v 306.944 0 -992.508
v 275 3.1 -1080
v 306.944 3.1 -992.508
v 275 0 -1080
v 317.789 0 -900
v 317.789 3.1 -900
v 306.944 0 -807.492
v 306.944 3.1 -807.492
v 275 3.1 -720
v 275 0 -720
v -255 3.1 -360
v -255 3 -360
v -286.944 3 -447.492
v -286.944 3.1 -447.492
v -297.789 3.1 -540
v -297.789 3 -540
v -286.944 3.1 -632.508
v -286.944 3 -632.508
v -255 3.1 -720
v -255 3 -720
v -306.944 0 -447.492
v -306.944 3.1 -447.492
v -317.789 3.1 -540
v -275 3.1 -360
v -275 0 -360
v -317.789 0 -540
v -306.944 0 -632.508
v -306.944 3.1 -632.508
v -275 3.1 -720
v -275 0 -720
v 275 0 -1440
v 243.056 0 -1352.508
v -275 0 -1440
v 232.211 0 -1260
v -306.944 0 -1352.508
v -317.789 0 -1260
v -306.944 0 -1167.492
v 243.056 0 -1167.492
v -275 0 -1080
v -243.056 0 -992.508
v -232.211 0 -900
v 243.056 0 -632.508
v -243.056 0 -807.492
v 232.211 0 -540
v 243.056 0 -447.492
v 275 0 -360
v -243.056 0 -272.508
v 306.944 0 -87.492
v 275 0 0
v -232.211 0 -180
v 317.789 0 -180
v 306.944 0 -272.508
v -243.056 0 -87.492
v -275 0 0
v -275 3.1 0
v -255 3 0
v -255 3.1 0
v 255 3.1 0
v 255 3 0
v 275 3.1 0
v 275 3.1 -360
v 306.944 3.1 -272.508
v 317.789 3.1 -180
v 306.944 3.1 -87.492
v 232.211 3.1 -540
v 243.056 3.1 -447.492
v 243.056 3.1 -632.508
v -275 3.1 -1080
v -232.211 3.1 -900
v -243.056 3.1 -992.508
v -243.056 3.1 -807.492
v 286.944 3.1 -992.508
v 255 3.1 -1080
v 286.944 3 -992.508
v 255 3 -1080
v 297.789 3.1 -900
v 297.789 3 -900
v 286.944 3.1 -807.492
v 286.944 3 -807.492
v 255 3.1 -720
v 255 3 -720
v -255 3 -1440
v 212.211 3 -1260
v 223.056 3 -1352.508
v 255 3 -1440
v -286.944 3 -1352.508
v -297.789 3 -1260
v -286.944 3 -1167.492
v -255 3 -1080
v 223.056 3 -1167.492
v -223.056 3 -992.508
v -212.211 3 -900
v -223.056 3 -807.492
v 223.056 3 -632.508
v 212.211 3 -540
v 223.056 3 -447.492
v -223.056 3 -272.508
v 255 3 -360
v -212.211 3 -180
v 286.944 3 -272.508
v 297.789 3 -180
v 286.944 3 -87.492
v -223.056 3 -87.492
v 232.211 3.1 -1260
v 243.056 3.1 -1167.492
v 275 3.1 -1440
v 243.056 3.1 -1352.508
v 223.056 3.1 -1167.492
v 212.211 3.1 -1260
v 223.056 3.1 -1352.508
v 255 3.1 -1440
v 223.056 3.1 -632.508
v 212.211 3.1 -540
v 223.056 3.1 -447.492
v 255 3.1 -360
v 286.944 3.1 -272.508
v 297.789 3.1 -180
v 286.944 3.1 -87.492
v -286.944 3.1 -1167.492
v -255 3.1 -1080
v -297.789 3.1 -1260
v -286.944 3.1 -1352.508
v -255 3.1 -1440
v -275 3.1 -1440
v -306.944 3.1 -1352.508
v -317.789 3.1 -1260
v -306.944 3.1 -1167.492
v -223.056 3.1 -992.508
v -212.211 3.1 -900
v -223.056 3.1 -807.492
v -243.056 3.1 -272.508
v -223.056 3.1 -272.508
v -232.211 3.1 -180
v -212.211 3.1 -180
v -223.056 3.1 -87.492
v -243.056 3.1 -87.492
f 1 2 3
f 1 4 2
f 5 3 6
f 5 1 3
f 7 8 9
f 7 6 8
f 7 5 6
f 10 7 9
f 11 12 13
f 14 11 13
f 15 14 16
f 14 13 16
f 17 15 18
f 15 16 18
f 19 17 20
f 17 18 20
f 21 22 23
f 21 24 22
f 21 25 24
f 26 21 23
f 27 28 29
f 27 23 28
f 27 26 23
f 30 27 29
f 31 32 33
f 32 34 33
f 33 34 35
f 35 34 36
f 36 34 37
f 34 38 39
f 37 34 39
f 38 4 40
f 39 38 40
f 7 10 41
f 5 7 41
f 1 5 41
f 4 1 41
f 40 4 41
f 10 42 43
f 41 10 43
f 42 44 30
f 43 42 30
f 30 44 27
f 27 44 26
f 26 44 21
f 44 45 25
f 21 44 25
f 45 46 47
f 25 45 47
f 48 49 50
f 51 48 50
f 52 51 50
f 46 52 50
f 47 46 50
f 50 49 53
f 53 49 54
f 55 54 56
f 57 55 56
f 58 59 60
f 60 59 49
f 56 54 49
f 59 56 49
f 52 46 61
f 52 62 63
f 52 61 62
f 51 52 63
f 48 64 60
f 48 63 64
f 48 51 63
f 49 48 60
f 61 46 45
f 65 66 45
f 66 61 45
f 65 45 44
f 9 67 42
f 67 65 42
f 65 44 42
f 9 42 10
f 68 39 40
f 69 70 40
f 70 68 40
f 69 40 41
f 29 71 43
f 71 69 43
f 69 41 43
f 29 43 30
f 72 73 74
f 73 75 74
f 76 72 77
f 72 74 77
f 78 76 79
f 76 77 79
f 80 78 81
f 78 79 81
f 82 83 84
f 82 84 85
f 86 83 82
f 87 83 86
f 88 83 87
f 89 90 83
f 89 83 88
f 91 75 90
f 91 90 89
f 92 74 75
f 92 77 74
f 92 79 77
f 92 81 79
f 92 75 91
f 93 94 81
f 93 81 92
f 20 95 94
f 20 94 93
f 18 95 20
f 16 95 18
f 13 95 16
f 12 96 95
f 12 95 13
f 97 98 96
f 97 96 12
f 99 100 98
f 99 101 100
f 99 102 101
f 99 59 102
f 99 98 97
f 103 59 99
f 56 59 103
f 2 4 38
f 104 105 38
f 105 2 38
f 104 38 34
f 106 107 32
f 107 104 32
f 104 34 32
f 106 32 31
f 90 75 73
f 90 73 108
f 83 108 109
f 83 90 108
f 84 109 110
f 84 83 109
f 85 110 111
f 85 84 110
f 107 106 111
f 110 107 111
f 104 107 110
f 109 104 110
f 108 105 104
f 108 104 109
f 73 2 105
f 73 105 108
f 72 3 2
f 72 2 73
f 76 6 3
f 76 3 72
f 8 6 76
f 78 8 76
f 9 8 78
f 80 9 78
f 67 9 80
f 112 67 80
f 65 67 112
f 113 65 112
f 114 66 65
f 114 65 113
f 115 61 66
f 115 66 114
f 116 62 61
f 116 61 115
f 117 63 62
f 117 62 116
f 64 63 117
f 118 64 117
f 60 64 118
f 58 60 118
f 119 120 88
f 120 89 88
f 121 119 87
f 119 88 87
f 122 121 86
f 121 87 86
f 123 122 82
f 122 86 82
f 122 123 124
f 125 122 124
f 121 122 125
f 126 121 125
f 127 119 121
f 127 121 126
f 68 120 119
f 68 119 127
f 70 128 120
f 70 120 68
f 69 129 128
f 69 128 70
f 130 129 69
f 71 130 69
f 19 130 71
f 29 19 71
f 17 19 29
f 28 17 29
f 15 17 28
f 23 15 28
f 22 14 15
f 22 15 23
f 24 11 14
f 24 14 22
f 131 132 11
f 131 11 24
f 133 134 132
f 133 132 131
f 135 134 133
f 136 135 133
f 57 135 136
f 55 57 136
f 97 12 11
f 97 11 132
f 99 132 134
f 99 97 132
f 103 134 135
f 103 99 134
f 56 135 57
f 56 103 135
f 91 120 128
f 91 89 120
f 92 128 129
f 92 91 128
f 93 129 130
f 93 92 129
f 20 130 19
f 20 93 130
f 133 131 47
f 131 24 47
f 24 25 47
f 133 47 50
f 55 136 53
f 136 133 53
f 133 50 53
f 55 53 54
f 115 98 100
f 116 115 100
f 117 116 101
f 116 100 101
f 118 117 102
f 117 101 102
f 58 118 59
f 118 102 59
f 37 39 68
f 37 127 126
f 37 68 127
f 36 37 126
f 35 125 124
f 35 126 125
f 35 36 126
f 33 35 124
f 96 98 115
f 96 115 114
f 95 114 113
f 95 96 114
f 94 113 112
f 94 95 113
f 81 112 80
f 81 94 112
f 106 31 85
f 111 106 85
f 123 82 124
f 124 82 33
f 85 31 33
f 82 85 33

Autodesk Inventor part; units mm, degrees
ref_plane "YZ Plane" through (0, 0, 0) normal (1, 0, 0) x (0, 1, 0)
ref_plane "XZ Plane" through (0, 0, 0) normal (0, 1, 0) x (-1, 0, 0)
ref_plane "XY Plane" through (0, 0, 0) normal (0, 0, 1) x (1, 0, 0)
sketch "Sketch1" plane through (0, 0, 0) normal (0, 1, 0) x (-1, 0, 0)
  line L0 (275, 0) -> (-275, 0)
  arc A0 (-275, 0) -> (-275, -360) centre (82.2114, -180) ccw
  arc A1 (-275, -720) -> (-275, -360) centre (-632.2114, -540) ccw
  arc A2 (-275, -720) -> (-275, -1080) centre (82.2114, -900) ccw
  arc A3 (-275, -1440) -> (-275, -1080) centre (-632.2114, -1260) ccw
  line L1 (-275, -1440) -> (275, -1440)
  line L2 (0, 0) -> (0, -1440) construction
  arc A4 (275, 0) -> (275, -360) centre (632.2114, -180) ccw
  arc A5 (275, -720) -> (275, -360) centre (-82.2114, -540) ccw
  arc A6 (275, -720) -> (275, -1080) centre (632.2114, -900) ccw
  arc A7 (275, -1440) -> (275, -1080) centre (-82.2114, -1260) ccw
  arc A8 (255, 0) -> (255, -360) centre (612.2114, -180) ccw
  arc A9 (255, -720) -> (255, -360) centre (-102.2114, -540) ccw
  arc A10 (255, -720) -> (255, -1080) centre (612.2114, -900) ccw
  arc A11 (255, -1440) -> (255, -1080) centre (-102.2114, -1260) ccw
  arc A12 (-255, 0) -> (-255, -360) centre (102.2114, -180) ccw
  arc A13 (-255, -720) -> (-255, -360) centre (-612.2114, -540) ccw
  arc A14 (-255, -720) -> (-255, -1080) centre (102.2114, -900) ccw
  arc A15 (-255, -1440) -> (-255, -1080) centre (-612.2114, -1260) ccw
  point P0 (255, 0)
  point P1 (-255, 0)
  dimension "d10" = 550
  dimension "d11" = 360
  dimension "d12" = 550
  dimension "d13" = 360
  dimension "d14" = 360
  dimension "d15" = 360
  dimension "d16" = 400
  dimension "d26" = 20
  dimension "d27" = 20
extrude "Extrusion1" add sketch "Sketch1" along normal blind 3
extrude "Extrusion2" add sketch "Sketch1" along normal blind 3.1 contours A4 A5 A6 A7 L1 A11 A10 A9 A8 L0 | A12 A13 A14 A15 L1 A3 A2 A1 A0 L0
equation "\"d10\" = track_width"
equation "\"d12\" = d10"
equation "\"d13\" = d11"
equation "\"d14\" = d11"
equation "\"d15\" = d11"
equation "\"d26\" = d27"
equation "\"d27\" = curb_width"
equation "\"d22\" = track_height"
equation "\"d28\" = track_height + curb_height"
equation "\"track_width\" = 550"
equation "\"curb_width\" = 20"
equation "\"track_height\" = 3"
equation "\"curb_height\" = 0.1"
properties part number "chicane"
